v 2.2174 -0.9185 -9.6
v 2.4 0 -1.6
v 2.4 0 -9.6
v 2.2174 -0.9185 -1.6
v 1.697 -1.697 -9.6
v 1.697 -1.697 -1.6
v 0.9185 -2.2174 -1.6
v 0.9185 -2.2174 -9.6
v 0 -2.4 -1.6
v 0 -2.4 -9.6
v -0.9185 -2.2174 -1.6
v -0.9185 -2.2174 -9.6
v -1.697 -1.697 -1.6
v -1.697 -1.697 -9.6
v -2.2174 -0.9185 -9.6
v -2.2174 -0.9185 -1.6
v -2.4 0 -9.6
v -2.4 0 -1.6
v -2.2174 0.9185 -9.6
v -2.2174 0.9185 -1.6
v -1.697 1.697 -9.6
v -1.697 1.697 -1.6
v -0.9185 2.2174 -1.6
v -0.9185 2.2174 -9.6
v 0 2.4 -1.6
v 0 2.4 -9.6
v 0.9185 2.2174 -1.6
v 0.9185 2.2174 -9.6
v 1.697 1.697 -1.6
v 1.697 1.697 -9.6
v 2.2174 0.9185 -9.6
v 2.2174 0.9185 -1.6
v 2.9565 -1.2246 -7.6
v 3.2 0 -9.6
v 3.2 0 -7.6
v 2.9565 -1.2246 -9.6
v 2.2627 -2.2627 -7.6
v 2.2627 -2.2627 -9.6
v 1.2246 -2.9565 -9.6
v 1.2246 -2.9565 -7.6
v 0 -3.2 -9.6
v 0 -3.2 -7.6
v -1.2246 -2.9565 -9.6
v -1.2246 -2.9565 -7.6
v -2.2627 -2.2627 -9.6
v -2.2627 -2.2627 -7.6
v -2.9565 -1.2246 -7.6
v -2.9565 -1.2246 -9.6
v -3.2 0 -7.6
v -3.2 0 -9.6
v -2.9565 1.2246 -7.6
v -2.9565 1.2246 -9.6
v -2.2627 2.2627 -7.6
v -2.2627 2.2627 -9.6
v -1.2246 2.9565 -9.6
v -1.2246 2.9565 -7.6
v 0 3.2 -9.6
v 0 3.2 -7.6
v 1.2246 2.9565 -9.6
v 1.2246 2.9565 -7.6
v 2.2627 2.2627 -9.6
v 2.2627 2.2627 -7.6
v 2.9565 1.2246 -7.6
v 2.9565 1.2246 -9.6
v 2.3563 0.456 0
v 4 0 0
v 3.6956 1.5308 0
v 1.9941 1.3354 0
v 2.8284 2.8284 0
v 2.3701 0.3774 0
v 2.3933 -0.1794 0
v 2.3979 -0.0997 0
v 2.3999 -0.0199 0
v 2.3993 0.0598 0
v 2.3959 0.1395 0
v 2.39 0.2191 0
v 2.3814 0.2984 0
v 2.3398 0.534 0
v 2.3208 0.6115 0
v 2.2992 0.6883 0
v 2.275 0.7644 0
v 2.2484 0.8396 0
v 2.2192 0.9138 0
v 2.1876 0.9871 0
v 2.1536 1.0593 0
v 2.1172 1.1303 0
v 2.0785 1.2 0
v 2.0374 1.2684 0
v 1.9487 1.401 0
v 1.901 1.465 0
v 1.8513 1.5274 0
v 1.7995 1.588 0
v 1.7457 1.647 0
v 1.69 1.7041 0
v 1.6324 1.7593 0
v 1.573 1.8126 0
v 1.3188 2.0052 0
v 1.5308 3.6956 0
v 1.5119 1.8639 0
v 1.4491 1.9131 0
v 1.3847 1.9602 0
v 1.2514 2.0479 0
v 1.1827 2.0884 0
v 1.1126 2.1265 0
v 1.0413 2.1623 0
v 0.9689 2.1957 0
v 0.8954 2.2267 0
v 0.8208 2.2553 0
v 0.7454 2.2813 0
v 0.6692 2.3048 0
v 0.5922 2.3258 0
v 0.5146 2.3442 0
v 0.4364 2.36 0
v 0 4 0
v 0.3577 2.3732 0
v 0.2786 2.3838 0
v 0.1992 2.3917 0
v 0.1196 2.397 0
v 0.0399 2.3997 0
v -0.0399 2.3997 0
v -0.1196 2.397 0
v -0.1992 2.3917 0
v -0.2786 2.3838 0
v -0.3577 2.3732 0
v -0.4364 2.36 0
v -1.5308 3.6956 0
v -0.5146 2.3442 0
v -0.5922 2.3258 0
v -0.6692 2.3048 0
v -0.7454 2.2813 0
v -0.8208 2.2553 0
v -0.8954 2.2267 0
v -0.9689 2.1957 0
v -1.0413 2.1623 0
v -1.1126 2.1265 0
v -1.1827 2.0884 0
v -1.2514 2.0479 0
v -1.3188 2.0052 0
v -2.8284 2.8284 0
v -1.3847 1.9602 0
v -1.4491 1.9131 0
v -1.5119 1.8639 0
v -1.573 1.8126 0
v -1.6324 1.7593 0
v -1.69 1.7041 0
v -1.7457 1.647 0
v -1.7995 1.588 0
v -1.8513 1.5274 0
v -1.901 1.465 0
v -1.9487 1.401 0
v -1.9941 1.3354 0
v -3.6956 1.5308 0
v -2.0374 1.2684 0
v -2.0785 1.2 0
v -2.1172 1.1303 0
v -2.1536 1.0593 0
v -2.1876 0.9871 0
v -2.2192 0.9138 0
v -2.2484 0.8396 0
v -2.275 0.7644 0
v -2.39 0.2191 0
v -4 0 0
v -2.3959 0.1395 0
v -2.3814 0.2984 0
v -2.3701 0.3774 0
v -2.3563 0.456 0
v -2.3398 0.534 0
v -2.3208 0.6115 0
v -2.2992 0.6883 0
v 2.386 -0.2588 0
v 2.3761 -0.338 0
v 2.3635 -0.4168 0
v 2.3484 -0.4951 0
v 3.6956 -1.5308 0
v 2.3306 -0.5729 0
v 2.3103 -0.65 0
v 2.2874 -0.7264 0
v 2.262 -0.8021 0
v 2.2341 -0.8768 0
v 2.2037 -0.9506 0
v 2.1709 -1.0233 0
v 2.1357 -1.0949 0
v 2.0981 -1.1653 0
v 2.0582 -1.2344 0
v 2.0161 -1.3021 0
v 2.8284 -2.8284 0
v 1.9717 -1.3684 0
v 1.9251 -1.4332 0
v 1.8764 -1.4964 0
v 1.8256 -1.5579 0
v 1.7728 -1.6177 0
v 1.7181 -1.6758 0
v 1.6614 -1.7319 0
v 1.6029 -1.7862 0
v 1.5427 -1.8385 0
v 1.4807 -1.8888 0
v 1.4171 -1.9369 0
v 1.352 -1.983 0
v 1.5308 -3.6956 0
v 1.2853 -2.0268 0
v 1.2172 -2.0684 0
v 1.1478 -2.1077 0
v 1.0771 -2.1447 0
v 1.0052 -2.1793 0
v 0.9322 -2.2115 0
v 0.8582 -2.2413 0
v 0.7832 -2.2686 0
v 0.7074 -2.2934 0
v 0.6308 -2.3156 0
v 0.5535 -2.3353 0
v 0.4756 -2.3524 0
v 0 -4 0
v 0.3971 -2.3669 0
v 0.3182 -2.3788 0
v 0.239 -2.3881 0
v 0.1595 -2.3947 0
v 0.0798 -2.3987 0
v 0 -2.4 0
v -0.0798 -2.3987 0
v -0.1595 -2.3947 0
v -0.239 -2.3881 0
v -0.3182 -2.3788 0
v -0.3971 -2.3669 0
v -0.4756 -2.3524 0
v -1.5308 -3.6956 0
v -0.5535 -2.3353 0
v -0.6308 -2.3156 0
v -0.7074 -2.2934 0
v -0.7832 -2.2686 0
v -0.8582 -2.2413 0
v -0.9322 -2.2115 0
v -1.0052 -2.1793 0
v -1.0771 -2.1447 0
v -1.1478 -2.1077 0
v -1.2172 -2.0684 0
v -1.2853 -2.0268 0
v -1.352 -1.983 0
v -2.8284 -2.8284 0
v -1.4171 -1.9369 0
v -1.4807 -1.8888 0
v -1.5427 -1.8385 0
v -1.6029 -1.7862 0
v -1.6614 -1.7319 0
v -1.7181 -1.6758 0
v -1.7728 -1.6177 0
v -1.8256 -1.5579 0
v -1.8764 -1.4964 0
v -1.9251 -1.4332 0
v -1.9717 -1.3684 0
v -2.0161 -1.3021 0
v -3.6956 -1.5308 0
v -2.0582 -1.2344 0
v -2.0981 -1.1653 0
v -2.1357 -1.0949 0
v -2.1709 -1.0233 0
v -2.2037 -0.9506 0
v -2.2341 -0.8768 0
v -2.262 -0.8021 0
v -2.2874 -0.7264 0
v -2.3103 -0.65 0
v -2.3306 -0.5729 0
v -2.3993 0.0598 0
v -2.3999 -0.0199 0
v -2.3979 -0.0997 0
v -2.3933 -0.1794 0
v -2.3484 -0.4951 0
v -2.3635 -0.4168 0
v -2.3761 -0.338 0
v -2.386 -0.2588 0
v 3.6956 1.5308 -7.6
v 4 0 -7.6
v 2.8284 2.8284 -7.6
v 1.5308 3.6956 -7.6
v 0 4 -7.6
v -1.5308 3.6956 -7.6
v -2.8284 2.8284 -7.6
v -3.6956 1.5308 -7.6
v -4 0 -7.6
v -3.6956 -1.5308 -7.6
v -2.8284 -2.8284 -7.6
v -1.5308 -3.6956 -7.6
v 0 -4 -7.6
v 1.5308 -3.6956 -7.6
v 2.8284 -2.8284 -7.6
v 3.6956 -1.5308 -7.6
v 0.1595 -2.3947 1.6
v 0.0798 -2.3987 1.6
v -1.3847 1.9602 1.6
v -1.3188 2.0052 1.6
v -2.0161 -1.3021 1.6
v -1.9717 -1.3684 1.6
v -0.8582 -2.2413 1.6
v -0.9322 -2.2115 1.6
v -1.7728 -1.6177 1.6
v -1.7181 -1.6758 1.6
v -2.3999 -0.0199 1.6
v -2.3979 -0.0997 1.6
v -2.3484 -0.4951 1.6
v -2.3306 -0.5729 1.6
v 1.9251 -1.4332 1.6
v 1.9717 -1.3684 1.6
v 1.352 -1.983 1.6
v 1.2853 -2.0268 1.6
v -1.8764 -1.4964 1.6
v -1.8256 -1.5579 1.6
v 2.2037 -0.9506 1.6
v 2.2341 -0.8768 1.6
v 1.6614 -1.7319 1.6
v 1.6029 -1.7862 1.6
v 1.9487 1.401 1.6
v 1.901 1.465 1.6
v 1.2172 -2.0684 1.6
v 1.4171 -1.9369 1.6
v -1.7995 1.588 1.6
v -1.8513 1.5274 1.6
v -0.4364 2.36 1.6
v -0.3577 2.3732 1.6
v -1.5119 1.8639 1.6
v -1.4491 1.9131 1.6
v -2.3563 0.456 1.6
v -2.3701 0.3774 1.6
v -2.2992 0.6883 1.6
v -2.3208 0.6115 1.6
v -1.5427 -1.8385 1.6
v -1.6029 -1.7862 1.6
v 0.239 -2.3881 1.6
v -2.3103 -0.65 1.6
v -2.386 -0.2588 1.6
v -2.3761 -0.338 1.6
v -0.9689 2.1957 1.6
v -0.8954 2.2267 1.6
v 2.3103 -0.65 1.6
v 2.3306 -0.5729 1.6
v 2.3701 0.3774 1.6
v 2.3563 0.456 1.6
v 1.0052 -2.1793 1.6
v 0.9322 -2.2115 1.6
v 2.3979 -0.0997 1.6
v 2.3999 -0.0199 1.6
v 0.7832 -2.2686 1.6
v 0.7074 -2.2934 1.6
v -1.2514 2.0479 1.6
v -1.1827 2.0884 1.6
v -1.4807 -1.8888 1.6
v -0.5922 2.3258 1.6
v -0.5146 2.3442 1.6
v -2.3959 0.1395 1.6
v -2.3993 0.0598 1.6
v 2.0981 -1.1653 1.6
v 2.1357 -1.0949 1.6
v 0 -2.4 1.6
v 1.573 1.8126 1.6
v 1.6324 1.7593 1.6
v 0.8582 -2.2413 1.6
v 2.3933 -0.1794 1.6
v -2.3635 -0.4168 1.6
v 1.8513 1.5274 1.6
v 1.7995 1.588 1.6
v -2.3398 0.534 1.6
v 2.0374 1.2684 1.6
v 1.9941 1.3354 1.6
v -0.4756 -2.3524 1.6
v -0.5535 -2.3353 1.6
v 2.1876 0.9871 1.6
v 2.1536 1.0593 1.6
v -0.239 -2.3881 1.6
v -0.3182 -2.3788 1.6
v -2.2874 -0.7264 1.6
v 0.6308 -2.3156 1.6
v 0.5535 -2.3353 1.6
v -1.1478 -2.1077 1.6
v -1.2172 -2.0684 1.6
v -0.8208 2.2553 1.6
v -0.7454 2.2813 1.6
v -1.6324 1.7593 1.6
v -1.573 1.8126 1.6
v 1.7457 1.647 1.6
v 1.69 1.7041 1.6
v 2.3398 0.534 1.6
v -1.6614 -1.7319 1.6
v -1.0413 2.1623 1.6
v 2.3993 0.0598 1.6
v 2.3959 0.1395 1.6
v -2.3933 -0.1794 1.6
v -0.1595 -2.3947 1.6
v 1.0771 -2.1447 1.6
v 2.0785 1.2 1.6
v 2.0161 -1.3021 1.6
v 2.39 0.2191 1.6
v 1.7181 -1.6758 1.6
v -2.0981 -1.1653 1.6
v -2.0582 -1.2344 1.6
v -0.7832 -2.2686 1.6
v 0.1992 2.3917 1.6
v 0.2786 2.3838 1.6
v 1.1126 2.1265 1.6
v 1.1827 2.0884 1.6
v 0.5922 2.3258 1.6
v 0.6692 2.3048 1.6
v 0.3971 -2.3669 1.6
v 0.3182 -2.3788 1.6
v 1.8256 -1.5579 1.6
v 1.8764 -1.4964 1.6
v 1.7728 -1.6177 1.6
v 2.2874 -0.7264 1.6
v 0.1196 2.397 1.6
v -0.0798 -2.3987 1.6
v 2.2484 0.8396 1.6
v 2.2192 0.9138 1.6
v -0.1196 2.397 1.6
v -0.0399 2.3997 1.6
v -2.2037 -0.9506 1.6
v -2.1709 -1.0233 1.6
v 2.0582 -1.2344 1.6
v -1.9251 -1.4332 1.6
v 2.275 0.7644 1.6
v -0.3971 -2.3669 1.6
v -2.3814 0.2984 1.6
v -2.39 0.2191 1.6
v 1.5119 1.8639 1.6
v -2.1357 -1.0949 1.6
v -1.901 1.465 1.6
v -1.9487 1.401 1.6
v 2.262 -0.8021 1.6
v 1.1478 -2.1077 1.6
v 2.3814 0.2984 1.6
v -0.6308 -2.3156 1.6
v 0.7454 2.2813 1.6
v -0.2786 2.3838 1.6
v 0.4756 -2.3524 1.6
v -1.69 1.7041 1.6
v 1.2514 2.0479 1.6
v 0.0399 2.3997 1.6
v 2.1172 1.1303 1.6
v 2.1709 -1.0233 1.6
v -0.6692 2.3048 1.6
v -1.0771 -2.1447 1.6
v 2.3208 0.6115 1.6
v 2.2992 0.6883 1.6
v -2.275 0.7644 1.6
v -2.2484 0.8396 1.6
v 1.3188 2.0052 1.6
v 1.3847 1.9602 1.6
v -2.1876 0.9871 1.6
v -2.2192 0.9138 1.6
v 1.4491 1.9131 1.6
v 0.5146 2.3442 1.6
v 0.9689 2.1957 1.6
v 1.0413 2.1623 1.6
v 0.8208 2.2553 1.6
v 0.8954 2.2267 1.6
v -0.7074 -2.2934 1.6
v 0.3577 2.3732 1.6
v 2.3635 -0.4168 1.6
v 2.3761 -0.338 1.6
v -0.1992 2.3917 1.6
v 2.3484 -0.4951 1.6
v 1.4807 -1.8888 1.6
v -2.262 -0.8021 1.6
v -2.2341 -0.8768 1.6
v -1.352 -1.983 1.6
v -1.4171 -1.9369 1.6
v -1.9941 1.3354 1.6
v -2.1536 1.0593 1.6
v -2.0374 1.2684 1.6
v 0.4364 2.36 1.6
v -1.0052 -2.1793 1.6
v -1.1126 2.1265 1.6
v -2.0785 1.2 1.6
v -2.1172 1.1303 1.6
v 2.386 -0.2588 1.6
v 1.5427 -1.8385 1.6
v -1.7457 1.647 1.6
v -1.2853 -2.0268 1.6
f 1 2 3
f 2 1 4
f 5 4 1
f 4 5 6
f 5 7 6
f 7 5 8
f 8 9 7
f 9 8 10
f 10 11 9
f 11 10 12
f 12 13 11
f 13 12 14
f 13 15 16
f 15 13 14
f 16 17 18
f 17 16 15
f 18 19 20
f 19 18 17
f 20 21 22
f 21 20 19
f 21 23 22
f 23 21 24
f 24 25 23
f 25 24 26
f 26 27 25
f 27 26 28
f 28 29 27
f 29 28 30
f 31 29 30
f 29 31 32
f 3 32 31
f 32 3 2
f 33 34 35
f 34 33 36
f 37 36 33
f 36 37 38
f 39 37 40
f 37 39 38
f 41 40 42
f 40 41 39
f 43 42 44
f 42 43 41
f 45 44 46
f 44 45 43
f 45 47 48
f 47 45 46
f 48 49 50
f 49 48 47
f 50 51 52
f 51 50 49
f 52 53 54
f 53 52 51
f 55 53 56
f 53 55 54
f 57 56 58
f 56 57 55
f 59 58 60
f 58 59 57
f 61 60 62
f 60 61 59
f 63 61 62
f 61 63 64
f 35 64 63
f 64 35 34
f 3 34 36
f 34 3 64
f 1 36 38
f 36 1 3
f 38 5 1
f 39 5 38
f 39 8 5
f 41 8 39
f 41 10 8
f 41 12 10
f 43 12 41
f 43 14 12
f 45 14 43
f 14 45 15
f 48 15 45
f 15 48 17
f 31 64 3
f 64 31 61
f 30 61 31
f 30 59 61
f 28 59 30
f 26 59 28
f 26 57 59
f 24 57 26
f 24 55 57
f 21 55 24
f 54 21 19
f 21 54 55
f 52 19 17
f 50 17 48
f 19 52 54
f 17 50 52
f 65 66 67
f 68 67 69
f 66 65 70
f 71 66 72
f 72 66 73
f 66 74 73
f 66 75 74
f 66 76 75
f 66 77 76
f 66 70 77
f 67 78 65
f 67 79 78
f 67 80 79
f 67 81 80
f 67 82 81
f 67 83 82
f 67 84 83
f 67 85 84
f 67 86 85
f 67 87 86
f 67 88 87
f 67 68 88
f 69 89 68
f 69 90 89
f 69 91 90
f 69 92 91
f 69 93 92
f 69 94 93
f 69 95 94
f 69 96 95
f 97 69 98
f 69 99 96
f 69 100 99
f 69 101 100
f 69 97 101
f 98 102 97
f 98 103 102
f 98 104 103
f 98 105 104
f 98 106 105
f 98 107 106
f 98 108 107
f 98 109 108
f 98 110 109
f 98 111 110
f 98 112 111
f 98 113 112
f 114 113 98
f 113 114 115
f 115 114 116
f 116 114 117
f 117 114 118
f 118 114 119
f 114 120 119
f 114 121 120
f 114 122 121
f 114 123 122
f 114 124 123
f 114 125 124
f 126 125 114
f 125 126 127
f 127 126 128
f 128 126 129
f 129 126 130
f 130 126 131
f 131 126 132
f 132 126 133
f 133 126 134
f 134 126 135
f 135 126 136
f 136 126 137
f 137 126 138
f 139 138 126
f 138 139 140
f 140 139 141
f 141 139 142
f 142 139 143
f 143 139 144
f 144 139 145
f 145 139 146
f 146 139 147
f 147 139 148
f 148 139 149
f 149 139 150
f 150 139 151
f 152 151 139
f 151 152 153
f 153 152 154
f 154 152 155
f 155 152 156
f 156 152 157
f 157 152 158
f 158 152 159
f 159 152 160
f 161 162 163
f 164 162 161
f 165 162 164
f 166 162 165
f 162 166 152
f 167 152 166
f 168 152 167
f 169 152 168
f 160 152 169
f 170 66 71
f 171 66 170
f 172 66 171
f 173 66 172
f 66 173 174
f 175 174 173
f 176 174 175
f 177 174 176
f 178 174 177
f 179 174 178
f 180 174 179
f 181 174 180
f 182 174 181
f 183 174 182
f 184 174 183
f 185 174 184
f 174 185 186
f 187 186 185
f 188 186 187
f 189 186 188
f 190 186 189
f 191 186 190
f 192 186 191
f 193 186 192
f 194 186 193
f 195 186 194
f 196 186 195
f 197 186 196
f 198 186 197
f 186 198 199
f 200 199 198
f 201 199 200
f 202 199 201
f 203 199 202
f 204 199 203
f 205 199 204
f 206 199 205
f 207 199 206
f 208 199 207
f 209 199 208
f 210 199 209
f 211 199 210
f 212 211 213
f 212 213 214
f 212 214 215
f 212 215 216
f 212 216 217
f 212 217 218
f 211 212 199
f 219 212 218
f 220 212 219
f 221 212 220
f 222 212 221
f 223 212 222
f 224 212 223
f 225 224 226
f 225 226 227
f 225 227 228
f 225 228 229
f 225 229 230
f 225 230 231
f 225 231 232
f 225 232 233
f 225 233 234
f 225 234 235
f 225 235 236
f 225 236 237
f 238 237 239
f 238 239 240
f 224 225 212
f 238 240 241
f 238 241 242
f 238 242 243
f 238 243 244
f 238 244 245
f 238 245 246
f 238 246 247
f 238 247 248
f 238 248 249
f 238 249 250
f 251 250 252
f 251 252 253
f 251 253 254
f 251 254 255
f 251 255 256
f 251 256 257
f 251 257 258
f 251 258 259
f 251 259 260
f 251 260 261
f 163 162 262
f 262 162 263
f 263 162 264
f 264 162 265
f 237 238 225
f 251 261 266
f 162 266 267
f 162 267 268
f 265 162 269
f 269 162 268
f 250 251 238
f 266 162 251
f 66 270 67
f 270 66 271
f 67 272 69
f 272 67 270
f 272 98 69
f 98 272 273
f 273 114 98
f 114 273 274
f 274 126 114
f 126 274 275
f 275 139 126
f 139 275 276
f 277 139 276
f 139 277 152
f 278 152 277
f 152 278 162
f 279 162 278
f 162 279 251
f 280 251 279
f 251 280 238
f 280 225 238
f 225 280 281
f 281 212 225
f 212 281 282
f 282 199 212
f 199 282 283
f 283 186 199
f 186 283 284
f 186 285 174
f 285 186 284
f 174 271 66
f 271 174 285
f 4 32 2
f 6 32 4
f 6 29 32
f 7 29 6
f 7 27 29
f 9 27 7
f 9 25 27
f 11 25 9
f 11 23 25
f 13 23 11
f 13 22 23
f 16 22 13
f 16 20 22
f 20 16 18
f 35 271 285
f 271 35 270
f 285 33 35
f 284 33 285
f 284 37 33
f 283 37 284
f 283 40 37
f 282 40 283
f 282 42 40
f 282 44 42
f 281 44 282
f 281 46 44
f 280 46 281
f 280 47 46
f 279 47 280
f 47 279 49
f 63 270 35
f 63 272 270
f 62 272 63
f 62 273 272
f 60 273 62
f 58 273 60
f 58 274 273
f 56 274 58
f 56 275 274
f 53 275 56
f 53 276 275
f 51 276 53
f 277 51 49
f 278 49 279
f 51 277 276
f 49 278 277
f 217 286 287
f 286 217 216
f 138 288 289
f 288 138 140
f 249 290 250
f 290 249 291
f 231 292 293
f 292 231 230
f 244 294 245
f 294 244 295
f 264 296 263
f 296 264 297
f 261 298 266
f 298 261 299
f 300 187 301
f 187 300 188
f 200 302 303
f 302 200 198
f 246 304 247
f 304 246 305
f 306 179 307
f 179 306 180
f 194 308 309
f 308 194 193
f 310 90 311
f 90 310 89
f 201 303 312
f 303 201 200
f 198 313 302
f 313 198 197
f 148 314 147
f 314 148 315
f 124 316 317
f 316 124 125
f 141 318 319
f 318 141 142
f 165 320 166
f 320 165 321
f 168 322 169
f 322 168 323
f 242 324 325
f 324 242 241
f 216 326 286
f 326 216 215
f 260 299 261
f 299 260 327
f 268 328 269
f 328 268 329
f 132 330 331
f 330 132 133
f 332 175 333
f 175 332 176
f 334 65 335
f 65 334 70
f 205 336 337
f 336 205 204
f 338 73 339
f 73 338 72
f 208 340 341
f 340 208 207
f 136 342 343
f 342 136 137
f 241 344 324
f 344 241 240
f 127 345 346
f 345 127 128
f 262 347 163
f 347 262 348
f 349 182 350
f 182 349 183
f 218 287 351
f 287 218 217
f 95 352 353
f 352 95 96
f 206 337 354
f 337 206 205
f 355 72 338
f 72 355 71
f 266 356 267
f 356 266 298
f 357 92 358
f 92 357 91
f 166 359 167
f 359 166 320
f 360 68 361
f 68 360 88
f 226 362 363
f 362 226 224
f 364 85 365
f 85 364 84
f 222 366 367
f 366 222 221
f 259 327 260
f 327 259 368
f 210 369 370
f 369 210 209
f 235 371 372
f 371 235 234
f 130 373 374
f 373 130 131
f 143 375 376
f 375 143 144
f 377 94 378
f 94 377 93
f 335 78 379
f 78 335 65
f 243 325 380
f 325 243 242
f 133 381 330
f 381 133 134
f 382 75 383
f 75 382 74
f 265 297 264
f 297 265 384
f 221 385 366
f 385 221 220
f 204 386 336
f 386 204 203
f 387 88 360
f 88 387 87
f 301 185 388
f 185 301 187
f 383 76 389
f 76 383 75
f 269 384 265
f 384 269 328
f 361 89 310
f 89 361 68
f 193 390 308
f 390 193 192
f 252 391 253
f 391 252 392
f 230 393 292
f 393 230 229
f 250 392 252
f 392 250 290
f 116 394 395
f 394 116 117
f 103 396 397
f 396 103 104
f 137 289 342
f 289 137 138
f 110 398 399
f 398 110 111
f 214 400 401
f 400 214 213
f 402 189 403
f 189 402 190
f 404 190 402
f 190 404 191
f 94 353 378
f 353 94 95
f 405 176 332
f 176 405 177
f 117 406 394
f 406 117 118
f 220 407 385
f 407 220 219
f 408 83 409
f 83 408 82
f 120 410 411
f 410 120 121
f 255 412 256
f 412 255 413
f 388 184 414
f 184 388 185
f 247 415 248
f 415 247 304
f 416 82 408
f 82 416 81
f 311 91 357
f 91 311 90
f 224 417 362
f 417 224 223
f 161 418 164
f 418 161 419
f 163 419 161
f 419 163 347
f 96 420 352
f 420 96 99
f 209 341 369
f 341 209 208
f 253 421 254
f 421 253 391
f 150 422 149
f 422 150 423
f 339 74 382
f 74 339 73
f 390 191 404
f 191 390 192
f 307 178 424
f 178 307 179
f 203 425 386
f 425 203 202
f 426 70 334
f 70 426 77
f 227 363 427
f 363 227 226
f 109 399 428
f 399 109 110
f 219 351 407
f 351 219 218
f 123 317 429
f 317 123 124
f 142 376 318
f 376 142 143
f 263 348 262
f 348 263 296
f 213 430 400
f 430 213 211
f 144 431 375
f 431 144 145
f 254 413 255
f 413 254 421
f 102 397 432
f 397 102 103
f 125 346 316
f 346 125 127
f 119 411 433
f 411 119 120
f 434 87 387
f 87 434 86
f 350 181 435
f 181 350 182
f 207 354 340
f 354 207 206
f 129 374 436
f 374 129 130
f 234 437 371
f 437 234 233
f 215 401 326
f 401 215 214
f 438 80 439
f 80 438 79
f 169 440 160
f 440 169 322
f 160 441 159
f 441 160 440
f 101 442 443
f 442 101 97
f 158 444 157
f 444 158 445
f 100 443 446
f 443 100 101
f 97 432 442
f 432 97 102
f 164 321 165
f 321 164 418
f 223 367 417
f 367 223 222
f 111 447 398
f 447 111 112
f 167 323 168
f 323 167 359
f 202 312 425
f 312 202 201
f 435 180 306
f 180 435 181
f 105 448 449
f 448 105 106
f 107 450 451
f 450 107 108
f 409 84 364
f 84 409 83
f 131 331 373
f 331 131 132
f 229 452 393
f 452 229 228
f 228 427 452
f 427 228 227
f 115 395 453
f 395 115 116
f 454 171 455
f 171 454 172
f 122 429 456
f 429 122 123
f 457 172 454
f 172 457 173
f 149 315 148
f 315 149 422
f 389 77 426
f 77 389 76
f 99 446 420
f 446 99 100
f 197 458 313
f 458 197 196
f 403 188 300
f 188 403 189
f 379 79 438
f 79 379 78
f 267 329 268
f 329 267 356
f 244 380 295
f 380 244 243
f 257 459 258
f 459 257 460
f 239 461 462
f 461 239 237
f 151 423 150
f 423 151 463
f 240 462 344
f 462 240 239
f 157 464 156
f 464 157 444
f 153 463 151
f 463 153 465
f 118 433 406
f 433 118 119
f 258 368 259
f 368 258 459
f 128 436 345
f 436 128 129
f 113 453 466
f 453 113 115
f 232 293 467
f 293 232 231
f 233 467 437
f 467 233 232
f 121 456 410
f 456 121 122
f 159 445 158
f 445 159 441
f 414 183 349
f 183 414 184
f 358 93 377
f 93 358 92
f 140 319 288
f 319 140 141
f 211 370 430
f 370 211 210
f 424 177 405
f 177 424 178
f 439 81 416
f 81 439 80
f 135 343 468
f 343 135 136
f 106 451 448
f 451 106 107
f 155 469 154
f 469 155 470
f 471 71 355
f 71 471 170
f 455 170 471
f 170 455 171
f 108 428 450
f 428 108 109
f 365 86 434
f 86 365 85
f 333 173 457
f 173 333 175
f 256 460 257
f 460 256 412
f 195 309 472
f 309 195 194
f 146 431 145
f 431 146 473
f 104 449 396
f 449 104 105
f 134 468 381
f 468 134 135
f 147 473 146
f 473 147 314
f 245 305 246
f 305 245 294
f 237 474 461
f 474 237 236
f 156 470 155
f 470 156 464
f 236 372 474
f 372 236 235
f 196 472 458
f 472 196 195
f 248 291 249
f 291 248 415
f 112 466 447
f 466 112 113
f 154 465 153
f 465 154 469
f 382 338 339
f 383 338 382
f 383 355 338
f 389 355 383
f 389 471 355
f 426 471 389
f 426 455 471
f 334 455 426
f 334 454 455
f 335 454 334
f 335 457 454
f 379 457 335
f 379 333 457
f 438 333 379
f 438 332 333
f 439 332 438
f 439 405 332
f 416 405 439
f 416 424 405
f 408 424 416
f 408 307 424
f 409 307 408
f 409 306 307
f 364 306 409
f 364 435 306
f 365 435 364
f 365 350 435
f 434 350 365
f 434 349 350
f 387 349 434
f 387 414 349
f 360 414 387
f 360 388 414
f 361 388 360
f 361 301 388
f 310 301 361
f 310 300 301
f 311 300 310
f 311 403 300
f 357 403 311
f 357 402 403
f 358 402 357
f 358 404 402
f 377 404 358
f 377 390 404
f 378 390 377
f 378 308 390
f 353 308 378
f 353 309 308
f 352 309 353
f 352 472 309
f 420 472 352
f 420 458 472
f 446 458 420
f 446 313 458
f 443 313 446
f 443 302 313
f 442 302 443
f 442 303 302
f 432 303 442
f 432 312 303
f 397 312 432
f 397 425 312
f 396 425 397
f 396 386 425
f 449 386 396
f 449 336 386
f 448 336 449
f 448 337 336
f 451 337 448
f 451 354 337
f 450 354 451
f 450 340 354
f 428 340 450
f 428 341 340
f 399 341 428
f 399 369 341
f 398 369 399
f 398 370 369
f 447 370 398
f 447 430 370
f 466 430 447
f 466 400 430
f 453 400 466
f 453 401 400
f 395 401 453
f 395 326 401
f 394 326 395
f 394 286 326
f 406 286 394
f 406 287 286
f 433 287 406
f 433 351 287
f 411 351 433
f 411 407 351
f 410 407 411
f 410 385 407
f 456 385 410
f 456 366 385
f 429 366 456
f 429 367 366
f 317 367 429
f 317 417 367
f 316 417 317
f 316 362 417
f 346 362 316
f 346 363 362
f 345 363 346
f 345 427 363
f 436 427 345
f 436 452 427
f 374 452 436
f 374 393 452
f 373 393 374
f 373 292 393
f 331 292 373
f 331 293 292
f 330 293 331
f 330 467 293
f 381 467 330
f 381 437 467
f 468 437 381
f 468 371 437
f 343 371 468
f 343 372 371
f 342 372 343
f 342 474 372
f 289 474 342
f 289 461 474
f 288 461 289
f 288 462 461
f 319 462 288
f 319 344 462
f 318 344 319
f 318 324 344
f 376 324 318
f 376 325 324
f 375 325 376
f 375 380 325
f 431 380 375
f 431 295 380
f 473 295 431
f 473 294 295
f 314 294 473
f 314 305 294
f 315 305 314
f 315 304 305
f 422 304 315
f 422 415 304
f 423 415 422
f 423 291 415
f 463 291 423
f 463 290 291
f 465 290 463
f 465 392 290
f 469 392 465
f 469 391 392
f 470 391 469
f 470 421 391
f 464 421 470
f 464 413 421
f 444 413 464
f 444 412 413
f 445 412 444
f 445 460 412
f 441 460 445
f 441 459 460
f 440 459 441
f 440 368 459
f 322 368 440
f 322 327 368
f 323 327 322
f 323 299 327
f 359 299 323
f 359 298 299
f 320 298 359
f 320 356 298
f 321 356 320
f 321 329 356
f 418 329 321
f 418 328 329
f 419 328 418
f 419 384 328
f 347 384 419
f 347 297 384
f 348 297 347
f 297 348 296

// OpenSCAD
use <../lib.scad>
use <3062a.scad>
$fa=1; $fs=0.2;
function ldraw_lib__708(realsolid=false) = [
// 0 ~Moved to 3062a
// 0 Name: 708.dat
// 0 Author: [PTadmin]
// 0 !LDRAW_ORG Part UPDATE 1998-06
// 0 !LICENSE Licensed under CC BY 4.0 : see CAreadme.txt
// 
// 0 BFC CERTIFY CCW
  [0,"BFC","CERTIFY"],
  [0,"BFC","CCW"],
// 
// 0 !HISTORY 1997-10-29 [PTadmin] Official Update 1997-16
// 0 !HISTORY 1998-06-20 [PTadmin] Official Update 1998-06
// 0 !HISTORY 2007-07-19 [PTadmin] Header formatted for Contributor Agreement
// 0 !HISTORY 2008-07-01 [PTadmin] Official Update 2008-01
// 
// 
// 1 16 0 0 0 1 0 0 0 1 0 0 0 1 3062a.dat
  [1,16,0,0,0,1,0,0,0,1,0,0,0,1, ldraw_lib__3062a(realsolid)],
];
module ldraw_lib__708(step=0, col=false, unit=2/5, alt=false, line=0.2, solid=!$preview)
    makepoly(ldraw_lib__708(solid), step=step, col=col, unit=unit, alt=alt, line=line, solid=solid);
ldraw_lib__708(line=0.2);
